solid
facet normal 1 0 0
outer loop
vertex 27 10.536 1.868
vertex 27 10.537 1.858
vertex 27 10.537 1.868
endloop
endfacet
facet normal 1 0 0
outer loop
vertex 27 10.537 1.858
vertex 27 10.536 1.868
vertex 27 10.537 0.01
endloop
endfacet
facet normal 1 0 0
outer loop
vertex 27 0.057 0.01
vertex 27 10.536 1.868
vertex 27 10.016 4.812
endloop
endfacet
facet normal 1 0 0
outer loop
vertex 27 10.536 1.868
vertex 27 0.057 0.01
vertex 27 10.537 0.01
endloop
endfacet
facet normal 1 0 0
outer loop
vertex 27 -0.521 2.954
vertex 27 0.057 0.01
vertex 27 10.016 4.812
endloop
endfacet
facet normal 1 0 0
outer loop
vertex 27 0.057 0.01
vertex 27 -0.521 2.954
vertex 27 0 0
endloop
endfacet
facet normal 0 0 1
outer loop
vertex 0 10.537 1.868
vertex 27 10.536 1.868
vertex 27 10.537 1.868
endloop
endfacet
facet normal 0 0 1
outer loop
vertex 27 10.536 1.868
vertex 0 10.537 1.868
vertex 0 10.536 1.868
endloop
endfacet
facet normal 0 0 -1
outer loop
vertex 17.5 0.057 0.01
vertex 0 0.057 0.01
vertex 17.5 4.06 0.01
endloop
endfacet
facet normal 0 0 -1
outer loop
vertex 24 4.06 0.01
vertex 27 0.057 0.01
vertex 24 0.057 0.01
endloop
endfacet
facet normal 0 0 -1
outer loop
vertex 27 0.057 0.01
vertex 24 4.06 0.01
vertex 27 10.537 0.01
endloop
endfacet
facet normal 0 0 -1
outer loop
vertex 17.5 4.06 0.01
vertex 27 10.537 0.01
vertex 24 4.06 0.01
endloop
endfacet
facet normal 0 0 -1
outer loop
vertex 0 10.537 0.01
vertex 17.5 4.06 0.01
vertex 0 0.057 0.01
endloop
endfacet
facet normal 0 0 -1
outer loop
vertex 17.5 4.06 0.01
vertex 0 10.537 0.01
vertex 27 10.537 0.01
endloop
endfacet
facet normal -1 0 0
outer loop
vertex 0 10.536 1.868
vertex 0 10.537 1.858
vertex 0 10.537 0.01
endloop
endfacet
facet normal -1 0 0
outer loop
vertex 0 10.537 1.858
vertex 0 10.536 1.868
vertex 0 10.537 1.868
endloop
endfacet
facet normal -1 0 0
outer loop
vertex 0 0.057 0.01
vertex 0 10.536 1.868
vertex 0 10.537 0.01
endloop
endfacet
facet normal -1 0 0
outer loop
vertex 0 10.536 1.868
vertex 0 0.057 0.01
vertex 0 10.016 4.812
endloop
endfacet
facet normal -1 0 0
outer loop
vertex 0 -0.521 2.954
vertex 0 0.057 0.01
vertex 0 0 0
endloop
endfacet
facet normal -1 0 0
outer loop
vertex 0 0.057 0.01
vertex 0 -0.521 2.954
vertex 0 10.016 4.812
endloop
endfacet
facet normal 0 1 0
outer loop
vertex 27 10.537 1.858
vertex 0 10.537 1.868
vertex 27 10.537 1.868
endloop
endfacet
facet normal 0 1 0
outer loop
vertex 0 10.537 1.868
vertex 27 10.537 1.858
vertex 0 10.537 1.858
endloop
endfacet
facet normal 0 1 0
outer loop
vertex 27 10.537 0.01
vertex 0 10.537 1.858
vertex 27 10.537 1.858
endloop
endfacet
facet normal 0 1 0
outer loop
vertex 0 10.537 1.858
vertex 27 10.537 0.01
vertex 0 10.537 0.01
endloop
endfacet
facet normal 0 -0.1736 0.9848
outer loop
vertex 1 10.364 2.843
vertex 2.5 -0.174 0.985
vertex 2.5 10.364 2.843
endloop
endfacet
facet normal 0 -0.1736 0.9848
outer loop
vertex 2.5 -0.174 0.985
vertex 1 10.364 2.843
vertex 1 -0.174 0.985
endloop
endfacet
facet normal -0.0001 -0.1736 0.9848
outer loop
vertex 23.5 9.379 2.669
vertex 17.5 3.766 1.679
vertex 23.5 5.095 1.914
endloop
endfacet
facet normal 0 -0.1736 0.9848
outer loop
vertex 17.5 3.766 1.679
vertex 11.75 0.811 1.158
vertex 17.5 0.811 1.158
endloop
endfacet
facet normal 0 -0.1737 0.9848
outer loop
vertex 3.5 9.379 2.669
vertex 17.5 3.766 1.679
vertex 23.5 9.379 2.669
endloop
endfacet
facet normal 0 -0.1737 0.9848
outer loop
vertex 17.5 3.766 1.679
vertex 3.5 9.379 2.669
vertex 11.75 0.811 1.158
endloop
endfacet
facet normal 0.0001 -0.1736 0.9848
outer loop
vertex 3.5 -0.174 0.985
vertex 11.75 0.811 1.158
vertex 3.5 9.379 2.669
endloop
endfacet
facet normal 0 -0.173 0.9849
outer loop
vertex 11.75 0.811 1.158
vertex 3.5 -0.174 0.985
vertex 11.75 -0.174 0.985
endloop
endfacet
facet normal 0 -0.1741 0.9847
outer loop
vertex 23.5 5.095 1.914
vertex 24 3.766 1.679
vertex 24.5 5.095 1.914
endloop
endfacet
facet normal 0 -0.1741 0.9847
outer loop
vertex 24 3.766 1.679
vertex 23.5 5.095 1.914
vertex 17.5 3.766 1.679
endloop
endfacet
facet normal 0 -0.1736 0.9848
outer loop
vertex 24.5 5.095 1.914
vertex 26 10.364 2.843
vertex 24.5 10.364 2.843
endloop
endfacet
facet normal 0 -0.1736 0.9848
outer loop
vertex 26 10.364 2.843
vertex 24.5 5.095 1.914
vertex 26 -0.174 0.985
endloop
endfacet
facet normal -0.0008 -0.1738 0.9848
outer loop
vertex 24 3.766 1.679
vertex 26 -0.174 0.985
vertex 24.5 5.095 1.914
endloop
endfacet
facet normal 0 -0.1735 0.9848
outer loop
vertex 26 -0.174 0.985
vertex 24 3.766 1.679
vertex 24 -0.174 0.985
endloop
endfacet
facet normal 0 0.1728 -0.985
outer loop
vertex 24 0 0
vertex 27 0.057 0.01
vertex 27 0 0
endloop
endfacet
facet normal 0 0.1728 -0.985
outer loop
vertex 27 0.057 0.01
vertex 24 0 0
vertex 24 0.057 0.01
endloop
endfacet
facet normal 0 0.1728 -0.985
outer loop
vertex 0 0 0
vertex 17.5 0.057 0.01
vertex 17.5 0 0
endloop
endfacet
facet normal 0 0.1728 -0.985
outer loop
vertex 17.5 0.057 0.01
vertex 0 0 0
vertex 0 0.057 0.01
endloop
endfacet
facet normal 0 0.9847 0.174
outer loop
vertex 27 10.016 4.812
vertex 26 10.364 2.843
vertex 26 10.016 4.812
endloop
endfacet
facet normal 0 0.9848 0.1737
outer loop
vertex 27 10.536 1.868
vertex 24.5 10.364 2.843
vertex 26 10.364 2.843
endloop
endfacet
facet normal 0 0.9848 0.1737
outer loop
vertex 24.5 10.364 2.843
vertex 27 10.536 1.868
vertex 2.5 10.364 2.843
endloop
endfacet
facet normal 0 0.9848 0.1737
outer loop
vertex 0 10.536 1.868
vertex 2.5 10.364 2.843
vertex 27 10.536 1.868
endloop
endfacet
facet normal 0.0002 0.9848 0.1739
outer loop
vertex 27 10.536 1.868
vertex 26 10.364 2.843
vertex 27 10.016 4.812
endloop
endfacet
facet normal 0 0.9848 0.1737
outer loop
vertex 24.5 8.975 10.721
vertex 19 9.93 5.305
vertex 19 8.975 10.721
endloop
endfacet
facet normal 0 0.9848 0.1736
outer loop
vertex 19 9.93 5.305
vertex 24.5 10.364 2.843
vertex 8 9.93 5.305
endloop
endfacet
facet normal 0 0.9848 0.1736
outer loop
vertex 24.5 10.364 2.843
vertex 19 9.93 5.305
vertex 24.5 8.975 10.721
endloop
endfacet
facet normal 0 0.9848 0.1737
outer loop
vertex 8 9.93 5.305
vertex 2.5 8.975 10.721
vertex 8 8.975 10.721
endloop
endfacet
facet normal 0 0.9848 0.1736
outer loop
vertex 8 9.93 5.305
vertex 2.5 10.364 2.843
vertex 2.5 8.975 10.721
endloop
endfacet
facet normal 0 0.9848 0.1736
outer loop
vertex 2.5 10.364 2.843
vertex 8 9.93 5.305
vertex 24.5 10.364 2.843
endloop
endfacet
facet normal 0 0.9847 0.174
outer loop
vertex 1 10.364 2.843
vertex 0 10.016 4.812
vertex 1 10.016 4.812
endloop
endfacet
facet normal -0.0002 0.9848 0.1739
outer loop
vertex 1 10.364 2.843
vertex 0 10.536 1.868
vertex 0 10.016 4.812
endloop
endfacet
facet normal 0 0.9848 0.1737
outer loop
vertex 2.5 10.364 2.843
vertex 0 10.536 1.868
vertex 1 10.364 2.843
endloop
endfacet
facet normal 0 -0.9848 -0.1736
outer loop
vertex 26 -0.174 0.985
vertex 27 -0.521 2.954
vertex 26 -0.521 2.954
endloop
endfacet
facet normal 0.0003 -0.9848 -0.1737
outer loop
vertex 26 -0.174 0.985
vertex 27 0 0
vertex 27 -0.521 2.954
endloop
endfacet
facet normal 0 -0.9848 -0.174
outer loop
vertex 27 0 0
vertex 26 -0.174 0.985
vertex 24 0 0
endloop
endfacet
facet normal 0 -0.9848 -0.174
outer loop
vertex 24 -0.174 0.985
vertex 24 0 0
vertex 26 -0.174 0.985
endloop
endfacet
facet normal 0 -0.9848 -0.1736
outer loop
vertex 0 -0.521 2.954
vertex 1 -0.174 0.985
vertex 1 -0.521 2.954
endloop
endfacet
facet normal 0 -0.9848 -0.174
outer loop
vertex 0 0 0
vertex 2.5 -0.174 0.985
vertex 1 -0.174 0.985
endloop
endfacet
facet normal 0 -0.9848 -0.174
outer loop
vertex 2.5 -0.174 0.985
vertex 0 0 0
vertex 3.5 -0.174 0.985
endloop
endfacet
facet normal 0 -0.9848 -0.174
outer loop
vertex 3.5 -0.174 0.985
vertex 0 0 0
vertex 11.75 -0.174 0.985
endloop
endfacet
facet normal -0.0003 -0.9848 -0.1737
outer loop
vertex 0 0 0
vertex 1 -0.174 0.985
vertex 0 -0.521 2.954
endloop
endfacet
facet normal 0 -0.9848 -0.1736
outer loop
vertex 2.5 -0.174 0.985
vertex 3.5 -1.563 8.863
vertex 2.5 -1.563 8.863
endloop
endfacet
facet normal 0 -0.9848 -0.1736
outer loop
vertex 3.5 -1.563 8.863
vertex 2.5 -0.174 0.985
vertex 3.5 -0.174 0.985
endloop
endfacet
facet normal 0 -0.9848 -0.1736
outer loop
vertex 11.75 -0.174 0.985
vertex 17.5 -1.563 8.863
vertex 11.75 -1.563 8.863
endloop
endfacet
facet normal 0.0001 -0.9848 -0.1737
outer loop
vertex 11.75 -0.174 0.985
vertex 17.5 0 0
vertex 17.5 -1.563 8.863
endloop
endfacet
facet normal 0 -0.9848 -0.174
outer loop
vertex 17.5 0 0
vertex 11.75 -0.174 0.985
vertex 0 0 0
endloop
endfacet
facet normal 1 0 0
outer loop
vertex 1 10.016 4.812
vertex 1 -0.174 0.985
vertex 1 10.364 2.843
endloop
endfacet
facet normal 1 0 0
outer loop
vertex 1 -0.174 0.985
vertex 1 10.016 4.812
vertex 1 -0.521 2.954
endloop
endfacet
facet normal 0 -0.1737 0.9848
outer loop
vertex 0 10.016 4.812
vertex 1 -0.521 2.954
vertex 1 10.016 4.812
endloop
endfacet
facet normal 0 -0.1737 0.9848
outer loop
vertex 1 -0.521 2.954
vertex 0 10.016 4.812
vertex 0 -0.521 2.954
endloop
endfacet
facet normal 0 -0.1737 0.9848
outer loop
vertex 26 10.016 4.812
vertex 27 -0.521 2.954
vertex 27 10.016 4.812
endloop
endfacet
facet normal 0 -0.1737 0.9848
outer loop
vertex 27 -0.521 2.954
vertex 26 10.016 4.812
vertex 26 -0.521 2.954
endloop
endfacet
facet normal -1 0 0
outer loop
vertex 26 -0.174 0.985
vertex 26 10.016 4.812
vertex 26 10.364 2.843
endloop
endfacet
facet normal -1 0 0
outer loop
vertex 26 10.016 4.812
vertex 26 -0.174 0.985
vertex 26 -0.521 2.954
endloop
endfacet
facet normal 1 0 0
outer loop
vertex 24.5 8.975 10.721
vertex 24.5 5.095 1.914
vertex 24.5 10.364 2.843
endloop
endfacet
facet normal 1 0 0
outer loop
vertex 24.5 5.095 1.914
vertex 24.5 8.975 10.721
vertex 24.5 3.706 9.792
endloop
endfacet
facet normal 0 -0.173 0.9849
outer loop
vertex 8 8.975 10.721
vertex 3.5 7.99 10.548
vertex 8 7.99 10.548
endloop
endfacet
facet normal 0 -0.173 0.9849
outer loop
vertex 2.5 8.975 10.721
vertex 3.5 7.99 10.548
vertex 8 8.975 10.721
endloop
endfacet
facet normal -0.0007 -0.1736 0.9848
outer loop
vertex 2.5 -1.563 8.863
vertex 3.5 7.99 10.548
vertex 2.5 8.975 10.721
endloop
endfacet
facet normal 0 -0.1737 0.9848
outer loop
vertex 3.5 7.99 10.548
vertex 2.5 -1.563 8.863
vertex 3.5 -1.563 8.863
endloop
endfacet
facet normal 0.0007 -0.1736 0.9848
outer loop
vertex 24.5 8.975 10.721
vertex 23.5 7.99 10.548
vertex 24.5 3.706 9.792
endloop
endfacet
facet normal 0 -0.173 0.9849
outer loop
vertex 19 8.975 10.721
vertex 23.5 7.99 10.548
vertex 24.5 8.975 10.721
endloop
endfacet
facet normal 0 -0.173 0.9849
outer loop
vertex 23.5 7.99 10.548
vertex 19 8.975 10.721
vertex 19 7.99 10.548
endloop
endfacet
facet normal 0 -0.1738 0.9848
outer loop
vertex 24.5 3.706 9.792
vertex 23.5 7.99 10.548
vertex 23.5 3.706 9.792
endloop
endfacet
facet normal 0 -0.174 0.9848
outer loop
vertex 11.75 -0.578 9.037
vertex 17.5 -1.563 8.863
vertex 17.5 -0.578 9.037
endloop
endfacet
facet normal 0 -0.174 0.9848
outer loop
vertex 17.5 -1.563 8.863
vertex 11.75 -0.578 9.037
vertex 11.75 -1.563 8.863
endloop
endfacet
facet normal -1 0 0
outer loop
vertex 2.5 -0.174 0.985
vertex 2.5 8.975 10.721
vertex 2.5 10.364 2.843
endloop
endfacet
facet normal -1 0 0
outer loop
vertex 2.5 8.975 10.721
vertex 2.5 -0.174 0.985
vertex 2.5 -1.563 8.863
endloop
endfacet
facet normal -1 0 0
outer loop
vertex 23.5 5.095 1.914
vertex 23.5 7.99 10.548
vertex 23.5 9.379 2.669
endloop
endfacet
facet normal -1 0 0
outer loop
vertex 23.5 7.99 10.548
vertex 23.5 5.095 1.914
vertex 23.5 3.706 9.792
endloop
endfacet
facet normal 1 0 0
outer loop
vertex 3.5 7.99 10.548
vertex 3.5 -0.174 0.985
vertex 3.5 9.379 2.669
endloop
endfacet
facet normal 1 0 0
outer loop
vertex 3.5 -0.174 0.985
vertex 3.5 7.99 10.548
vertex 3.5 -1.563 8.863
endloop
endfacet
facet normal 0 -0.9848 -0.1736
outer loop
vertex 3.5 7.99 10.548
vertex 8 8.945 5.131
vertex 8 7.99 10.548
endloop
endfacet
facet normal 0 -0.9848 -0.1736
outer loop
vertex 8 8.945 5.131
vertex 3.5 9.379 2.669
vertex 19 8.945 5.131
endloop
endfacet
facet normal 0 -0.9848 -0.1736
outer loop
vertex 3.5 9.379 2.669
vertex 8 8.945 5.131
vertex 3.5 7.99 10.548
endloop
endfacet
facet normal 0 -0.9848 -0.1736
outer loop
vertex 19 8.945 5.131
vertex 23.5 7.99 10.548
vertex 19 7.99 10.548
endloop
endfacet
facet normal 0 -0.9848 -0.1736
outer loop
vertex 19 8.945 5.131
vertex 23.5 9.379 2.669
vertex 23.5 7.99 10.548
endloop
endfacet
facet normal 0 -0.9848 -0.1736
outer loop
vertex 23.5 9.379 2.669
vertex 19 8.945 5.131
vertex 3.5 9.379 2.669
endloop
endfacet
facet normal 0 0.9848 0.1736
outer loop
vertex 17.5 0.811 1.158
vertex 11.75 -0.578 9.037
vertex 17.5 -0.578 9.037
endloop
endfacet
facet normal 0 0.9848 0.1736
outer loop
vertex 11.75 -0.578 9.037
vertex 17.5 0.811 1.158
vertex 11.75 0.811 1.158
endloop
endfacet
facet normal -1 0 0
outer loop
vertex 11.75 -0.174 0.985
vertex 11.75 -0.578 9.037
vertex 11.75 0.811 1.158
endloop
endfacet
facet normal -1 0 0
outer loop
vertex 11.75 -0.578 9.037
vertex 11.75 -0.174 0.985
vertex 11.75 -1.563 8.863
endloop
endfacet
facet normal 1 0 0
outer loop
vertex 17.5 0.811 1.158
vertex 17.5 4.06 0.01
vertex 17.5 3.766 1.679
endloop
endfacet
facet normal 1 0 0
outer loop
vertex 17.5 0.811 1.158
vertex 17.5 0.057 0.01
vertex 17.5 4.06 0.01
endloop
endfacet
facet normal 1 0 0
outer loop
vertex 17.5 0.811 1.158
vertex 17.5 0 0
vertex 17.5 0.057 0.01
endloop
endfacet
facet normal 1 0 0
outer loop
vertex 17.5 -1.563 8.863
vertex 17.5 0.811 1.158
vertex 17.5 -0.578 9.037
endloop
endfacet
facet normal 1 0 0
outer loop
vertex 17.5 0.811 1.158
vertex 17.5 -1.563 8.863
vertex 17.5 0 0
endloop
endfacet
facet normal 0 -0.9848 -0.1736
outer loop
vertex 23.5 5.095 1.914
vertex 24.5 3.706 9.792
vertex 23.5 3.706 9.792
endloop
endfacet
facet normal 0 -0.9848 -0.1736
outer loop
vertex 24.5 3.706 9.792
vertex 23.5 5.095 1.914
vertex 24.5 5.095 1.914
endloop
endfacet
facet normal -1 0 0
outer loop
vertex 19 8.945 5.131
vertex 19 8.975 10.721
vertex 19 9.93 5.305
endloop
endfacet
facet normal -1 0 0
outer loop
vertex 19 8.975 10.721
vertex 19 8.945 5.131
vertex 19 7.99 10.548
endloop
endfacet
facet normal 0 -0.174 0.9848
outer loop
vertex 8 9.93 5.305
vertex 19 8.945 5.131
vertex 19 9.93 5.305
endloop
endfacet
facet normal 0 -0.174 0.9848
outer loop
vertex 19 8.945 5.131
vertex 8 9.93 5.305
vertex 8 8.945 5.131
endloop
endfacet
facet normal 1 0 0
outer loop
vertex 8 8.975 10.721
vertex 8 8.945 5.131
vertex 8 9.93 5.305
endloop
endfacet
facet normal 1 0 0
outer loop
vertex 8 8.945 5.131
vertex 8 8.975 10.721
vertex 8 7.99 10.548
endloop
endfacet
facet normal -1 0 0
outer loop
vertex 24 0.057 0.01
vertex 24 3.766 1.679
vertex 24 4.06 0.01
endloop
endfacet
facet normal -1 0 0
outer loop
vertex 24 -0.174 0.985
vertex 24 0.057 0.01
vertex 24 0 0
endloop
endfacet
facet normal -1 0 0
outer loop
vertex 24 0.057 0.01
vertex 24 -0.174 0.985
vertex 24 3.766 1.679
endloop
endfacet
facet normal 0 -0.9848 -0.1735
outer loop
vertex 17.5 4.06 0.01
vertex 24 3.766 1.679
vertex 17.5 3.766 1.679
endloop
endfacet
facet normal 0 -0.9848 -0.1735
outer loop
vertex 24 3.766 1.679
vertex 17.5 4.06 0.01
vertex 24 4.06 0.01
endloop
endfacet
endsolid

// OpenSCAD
/* [Angle] */
// Angle in degrees
angle = 10; // [0:1:89]

/* [Measurements] */
// Wall thickness
walls = 1;
width = 8.7;
length = 20;
height = 8;

hookSpacing = 1.5;
hookHeight = 2;

displayCutoutLength = 7.25;

wireCutoutLength = 7;

camDiameter = 11;
camZOffset = 2.5;

/* [Hidden] */
outerLength = length + walls * 2;
outerWidth = width + walls * 2;
outerHeight = height + walls;

hookLength = outerLength + walls * 2 + hookSpacing * 2;

difference() {
    angled();
    
    rotate([angle, 0, 0])
        translate([hookSpacing + outerLength - wireCutoutLength + walls, -1, -1])
            cube([wireCutoutLength - walls / 2, walls + 4, walls + 2]);
}


module angled() {
    translate([0, 0, 0.01])
        wedge();
    rotate([angle, 0, 0])
        bracket();
}

module wedge() {
    a = outerWidth * cos(90 - angle);
    b = sqrt(outerWidth * outerWidth - a * a);

    difference() {
        cube([hookLength, b,  a]);
        rotate([angle, 0, 0])
            cube([hookLength, b,  a]);
    }
    
}

module bracket() {
    hook();
    rotate([0,0,0])
    translate([walls + hookSpacing, 0, 0])
        camMount();
}

module hook() {
    cube([hookLength, outerWidth, walls]);
    cube([walls, outerWidth, hookHeight + walls]);
    translate([hookLength - walls, 0, 0])
        cube([walls, outerWidth, hookHeight + walls]);
}

module camMount() {
    difference() {
        cube([outerLength, outerWidth, outerHeight]);
        
        translate([walls, walls, walls])
            cube([length, width, height + 1]);
        
        // Display cutout
        translate([walls, -1, walls])
            cube([displayCutoutLength + 1, outerWidth/2 + 1, height + 1]);
        
        translate([outerLength - wireCutoutLength, -1, walls])
            cube([wireCutoutLength + 1, outerWidth/2 + 1, height + 1]);
        
        // Cam cutout
        translate([length / 2 + walls - camDiameter / 2, width, camZOffset + walls])
            cube([camDiameter, walls + 2, outerHeight]);
    }
}
